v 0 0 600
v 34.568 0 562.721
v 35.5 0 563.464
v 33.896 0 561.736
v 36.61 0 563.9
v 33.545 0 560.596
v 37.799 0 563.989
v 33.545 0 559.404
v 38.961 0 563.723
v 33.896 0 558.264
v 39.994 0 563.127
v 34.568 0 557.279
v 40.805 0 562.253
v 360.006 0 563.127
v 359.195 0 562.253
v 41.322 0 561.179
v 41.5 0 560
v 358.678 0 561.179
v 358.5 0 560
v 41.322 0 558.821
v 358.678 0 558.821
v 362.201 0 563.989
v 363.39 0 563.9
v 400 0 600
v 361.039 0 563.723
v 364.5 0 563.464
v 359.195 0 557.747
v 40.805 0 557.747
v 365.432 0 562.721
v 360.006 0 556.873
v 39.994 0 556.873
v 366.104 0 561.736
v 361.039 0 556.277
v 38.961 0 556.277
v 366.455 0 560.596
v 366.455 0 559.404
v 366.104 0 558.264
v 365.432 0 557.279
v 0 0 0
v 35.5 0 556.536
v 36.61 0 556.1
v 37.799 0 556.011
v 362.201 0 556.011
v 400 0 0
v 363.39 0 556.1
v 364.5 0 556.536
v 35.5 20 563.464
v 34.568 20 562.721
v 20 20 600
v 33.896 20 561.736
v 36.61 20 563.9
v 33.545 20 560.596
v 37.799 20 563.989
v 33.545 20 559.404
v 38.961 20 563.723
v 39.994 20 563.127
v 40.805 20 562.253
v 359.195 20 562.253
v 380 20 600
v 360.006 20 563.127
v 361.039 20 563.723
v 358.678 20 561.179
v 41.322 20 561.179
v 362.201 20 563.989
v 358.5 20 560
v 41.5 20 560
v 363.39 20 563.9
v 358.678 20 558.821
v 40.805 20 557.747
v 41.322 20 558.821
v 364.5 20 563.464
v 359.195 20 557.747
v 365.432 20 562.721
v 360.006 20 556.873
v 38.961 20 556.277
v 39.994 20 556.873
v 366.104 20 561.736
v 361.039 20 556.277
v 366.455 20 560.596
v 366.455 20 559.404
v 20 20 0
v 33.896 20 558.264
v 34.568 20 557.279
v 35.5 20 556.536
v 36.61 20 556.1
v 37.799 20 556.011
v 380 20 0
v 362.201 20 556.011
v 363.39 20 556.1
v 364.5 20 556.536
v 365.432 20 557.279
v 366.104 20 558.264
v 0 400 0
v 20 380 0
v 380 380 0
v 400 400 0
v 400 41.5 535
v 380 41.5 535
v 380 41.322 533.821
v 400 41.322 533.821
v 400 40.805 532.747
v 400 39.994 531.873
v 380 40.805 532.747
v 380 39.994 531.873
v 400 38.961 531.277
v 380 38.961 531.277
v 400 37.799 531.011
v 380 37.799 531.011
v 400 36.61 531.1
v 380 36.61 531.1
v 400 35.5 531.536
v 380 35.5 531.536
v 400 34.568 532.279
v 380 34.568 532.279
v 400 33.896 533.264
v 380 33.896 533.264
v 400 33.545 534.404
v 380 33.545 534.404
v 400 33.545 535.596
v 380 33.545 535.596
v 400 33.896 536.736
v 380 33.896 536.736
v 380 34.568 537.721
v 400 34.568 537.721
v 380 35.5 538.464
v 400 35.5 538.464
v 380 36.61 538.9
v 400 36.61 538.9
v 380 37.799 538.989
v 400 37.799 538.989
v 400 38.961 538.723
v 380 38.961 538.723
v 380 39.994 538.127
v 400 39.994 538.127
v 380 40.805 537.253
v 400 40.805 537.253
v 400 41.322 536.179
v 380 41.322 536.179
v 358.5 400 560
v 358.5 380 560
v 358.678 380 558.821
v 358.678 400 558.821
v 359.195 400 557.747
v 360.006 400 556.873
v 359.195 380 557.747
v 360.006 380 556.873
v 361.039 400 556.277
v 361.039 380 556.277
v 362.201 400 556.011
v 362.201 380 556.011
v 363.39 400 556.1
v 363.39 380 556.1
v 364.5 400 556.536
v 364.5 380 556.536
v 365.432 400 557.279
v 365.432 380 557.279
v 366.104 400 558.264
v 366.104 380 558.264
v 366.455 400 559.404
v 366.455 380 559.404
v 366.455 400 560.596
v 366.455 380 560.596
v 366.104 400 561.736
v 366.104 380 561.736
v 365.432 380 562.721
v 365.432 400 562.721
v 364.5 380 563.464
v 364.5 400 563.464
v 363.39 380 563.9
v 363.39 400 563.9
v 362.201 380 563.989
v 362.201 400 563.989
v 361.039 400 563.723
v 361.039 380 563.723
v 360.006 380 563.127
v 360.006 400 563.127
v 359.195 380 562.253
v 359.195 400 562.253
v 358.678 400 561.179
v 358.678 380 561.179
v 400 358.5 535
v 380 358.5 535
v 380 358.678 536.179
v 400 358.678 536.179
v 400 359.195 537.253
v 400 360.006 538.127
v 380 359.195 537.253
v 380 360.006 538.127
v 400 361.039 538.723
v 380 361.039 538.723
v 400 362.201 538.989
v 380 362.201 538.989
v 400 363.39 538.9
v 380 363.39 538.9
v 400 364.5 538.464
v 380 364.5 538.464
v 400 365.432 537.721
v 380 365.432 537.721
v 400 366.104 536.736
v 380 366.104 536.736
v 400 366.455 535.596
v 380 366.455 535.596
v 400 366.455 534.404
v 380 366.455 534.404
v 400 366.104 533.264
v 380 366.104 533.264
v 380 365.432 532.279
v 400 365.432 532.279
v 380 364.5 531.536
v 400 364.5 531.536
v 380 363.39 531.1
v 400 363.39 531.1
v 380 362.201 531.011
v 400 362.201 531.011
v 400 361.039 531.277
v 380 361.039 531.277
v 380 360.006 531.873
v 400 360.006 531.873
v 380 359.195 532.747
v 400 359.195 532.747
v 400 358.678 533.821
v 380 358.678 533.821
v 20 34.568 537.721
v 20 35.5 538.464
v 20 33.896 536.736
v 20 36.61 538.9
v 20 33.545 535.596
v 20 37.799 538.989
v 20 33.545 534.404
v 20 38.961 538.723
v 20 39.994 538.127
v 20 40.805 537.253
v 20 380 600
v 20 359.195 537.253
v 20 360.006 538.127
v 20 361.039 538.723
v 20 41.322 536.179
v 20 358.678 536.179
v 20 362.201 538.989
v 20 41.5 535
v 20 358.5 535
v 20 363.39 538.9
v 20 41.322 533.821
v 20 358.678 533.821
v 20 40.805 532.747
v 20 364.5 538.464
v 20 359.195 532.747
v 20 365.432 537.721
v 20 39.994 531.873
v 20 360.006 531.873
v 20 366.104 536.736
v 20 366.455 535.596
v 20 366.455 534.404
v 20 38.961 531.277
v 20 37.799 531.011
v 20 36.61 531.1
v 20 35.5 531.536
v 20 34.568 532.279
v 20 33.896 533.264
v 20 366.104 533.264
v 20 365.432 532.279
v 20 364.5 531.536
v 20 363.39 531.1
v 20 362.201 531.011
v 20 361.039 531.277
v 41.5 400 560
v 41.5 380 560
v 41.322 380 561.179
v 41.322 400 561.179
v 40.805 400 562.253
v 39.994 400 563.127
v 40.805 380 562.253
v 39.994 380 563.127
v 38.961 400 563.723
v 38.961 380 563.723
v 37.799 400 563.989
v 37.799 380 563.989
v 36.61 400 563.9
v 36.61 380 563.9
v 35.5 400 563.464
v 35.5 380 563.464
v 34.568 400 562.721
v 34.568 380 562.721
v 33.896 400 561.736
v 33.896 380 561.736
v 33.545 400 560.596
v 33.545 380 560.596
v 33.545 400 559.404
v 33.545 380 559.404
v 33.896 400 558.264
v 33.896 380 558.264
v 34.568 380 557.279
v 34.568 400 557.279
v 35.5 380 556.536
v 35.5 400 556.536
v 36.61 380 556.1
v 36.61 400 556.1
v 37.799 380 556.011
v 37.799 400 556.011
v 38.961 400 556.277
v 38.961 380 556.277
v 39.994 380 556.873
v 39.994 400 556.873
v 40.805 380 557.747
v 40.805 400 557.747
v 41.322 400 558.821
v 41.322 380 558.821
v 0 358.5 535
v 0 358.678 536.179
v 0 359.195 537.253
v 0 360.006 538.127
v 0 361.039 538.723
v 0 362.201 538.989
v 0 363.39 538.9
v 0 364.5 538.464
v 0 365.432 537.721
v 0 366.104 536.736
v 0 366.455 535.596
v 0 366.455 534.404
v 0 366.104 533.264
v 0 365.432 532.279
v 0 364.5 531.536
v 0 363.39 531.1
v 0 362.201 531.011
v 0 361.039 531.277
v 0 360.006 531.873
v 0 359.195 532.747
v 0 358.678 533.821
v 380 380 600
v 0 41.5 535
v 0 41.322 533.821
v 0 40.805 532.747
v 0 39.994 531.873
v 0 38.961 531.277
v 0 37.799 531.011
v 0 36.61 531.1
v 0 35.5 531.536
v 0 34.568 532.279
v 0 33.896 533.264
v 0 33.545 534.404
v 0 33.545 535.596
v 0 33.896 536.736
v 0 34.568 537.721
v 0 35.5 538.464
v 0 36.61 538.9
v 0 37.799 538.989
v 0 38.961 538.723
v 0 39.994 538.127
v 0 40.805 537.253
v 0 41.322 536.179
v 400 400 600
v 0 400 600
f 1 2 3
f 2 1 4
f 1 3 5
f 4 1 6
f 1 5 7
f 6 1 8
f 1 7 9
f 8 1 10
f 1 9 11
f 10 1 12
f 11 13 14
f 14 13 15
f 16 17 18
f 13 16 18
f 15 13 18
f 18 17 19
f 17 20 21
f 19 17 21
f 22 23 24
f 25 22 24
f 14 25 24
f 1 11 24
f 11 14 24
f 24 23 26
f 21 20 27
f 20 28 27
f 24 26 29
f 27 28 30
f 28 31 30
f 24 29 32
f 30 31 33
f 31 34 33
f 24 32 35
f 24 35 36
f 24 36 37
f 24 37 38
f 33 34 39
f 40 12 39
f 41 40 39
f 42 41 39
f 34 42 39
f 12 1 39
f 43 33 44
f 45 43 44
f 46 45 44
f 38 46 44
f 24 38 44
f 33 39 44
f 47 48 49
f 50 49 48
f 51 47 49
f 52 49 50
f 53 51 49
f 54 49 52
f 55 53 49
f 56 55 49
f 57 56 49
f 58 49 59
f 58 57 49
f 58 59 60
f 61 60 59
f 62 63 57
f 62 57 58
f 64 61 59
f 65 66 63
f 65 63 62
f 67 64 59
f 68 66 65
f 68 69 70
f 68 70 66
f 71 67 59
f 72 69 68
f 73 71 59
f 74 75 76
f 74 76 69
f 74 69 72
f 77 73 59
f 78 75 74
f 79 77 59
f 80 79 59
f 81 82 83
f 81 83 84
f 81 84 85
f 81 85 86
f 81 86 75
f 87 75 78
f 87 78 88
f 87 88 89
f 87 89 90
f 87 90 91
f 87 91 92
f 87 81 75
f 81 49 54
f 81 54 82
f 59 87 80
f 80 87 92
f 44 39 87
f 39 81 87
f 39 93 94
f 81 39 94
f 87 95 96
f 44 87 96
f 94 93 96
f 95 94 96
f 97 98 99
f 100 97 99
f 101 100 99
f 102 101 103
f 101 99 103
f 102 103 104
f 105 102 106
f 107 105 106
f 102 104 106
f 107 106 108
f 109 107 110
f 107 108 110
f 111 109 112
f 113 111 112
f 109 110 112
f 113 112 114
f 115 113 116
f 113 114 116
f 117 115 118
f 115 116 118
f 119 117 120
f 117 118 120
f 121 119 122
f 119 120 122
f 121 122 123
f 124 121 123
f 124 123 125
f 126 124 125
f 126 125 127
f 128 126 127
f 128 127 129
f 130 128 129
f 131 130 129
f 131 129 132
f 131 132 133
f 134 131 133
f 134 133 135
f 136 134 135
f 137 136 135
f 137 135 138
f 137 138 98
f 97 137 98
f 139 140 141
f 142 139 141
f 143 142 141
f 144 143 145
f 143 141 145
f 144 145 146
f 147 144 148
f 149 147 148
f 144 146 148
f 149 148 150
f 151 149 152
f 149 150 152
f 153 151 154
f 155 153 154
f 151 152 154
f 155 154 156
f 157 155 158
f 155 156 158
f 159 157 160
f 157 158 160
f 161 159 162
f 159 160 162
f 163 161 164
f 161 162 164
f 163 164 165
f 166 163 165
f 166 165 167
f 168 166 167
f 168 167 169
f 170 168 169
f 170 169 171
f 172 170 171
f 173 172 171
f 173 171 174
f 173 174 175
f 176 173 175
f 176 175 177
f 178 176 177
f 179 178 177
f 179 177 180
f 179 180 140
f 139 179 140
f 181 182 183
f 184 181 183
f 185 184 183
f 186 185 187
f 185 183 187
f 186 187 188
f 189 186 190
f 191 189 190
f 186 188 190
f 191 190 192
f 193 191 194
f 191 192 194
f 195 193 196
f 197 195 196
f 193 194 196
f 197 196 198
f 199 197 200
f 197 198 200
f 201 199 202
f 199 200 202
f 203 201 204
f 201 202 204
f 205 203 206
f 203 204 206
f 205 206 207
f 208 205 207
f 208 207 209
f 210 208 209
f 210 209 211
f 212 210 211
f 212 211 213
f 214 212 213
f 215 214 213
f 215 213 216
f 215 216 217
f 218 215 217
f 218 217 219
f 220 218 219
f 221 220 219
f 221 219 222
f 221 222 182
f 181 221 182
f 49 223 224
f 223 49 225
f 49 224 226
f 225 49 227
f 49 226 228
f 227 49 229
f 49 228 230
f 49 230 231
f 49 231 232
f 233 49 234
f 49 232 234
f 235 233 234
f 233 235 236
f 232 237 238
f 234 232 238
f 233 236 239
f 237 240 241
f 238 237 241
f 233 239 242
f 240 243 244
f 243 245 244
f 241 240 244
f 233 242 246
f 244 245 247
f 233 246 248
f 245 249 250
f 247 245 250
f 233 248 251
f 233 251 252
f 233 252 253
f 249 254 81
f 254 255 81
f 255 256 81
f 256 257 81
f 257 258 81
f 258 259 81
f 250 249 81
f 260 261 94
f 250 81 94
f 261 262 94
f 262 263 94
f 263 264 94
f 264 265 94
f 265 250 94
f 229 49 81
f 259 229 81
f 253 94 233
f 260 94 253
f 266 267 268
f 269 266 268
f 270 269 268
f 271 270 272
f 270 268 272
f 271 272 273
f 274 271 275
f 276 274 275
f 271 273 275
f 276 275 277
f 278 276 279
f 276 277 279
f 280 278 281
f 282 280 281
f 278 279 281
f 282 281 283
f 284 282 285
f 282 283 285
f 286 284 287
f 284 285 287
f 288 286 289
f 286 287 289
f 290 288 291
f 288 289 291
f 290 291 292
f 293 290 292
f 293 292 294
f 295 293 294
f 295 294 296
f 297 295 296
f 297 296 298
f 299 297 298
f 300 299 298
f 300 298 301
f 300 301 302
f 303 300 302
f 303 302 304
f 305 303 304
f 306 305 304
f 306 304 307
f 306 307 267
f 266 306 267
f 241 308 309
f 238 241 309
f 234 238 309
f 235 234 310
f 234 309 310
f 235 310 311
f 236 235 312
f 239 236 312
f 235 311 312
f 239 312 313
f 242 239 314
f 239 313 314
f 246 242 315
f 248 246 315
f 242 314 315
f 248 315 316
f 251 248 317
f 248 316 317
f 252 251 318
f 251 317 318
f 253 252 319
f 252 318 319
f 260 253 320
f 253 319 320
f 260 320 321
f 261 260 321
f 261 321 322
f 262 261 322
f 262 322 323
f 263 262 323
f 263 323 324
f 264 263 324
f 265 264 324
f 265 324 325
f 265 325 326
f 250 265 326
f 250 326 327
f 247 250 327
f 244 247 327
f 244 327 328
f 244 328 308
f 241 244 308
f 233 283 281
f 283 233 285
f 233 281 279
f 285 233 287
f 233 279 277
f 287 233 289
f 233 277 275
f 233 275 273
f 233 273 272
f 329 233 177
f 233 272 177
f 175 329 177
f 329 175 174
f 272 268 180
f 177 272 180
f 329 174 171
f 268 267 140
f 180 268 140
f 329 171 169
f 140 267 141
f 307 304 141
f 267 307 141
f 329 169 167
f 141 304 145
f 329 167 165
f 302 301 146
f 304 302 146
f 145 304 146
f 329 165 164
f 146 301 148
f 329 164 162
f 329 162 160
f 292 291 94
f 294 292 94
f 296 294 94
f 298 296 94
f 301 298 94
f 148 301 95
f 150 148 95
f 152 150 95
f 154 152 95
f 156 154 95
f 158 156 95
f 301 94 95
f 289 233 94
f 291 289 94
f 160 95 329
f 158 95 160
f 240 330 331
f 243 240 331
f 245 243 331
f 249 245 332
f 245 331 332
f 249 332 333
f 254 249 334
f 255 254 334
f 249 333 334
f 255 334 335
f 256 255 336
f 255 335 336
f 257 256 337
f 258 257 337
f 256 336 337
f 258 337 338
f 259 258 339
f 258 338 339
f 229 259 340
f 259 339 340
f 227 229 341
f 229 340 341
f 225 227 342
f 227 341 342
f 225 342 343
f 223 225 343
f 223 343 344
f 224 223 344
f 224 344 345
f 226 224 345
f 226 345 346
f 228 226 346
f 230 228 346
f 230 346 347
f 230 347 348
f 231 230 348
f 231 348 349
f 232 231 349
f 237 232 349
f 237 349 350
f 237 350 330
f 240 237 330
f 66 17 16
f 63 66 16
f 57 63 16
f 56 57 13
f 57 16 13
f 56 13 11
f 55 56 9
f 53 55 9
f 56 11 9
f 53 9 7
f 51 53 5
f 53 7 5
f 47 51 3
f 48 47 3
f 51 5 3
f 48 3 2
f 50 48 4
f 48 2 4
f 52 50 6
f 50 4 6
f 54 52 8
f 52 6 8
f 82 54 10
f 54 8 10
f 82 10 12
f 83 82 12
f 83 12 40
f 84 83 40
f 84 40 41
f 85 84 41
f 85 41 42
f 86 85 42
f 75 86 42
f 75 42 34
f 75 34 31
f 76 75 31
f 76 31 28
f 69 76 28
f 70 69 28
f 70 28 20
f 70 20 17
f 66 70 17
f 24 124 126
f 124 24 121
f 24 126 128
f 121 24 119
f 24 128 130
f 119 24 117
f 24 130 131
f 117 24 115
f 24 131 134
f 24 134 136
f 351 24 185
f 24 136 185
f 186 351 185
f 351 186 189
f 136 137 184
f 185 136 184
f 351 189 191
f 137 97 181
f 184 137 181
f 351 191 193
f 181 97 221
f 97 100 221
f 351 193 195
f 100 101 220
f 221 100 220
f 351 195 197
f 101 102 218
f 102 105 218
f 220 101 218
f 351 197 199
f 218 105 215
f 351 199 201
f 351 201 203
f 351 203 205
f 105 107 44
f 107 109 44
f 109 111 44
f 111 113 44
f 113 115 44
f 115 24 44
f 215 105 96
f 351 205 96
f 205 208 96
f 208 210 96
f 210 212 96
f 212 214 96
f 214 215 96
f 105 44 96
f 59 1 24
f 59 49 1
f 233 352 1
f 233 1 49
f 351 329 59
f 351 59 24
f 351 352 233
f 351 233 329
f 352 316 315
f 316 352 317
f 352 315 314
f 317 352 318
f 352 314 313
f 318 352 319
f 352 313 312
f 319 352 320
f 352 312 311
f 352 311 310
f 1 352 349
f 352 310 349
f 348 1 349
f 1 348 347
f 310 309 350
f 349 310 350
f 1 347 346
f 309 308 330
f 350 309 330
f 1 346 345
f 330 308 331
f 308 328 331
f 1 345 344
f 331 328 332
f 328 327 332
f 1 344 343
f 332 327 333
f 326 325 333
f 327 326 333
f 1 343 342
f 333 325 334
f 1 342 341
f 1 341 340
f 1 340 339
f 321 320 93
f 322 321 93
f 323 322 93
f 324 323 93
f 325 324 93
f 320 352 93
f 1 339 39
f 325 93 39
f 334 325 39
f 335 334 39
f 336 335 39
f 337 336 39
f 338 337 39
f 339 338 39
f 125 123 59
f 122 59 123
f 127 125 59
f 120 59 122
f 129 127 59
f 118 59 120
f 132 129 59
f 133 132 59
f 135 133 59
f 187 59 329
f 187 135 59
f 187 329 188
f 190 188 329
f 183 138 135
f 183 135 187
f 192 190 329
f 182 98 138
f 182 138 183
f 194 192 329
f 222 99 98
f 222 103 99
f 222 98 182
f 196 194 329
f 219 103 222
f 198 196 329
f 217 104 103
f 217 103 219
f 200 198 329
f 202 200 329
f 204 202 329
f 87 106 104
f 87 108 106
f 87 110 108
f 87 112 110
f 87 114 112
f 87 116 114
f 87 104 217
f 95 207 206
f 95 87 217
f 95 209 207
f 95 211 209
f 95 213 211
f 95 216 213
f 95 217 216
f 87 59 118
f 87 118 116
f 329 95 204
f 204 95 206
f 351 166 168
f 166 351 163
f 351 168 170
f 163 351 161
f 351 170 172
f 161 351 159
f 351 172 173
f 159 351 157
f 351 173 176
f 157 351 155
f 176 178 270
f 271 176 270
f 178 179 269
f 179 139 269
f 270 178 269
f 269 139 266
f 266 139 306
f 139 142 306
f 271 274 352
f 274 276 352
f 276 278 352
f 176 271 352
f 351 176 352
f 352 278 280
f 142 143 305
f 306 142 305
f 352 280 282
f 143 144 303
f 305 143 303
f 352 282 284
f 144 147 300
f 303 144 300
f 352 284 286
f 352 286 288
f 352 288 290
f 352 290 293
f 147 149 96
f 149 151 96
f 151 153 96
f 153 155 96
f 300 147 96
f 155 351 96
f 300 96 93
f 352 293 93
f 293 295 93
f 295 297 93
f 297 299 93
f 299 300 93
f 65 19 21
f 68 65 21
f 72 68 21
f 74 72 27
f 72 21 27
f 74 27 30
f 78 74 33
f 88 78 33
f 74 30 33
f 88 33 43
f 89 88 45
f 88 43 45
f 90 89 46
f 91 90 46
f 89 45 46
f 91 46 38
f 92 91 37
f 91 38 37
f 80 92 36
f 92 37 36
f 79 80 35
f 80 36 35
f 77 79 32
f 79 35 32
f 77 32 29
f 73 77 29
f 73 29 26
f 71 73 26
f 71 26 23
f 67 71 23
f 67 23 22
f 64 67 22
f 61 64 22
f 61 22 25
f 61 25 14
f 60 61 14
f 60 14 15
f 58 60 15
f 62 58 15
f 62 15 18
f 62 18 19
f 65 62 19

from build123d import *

# Parameters (mm, degrees)
F0_W     = 360
F0_H     = 360
F1_DEPTH = 600
F2_R     = 4
F3_DEPTH = 406
F4_R     = 4
F5_DEPTH = 467


with BuildPart() as f1:
    # F0 (on Top) → F1 (new body)
    with BuildSketch(Plane.XY):
        Polygon((0, 400), (0, 0), (20, 0), (400, 0), (400, 400), align=None)
        with Locations((200, 200)):
            Rectangle(F0_W, F0_H, mode=Mode.SUBTRACT)
    extrude(amount=F1_DEPTH)

    # F2 (on face) → F3 (cut)
    with BuildSketch(Plane.XZ):
        with Locations((37.5, 560)):
            Circle(F2_R)
        with BuildLine():
            ThreePointArc((366.5, 560), (362.5, 564), (358.5, 560))
            ThreePointArc((358.5, 560), (362.5, 556), (366.5, 560))
        make_face()
    extrude(amount=-F3_DEPTH, mode=Mode.SUBTRACT)

    # F4 (on face) → F5 (cut)
    with BuildSketch(Plane(origin=(0, 0, 0), x_dir=(0, -1, 0), z_dir=(-1, 0, 0))):
        with Locations((-362.5, 535)):
            Circle(F4_R)
        with BuildLine():
            ThreePointArc((-33.5, 535), (-37.5, 539), (-41.5, 535))
            ThreePointArc((-41.5, 535), (-37.5, 531), (-33.5, 535))
        make_face()
    extrude(amount=-F5_DEPTH, mode=Mode.SUBTRACT)


solid = f1.part
